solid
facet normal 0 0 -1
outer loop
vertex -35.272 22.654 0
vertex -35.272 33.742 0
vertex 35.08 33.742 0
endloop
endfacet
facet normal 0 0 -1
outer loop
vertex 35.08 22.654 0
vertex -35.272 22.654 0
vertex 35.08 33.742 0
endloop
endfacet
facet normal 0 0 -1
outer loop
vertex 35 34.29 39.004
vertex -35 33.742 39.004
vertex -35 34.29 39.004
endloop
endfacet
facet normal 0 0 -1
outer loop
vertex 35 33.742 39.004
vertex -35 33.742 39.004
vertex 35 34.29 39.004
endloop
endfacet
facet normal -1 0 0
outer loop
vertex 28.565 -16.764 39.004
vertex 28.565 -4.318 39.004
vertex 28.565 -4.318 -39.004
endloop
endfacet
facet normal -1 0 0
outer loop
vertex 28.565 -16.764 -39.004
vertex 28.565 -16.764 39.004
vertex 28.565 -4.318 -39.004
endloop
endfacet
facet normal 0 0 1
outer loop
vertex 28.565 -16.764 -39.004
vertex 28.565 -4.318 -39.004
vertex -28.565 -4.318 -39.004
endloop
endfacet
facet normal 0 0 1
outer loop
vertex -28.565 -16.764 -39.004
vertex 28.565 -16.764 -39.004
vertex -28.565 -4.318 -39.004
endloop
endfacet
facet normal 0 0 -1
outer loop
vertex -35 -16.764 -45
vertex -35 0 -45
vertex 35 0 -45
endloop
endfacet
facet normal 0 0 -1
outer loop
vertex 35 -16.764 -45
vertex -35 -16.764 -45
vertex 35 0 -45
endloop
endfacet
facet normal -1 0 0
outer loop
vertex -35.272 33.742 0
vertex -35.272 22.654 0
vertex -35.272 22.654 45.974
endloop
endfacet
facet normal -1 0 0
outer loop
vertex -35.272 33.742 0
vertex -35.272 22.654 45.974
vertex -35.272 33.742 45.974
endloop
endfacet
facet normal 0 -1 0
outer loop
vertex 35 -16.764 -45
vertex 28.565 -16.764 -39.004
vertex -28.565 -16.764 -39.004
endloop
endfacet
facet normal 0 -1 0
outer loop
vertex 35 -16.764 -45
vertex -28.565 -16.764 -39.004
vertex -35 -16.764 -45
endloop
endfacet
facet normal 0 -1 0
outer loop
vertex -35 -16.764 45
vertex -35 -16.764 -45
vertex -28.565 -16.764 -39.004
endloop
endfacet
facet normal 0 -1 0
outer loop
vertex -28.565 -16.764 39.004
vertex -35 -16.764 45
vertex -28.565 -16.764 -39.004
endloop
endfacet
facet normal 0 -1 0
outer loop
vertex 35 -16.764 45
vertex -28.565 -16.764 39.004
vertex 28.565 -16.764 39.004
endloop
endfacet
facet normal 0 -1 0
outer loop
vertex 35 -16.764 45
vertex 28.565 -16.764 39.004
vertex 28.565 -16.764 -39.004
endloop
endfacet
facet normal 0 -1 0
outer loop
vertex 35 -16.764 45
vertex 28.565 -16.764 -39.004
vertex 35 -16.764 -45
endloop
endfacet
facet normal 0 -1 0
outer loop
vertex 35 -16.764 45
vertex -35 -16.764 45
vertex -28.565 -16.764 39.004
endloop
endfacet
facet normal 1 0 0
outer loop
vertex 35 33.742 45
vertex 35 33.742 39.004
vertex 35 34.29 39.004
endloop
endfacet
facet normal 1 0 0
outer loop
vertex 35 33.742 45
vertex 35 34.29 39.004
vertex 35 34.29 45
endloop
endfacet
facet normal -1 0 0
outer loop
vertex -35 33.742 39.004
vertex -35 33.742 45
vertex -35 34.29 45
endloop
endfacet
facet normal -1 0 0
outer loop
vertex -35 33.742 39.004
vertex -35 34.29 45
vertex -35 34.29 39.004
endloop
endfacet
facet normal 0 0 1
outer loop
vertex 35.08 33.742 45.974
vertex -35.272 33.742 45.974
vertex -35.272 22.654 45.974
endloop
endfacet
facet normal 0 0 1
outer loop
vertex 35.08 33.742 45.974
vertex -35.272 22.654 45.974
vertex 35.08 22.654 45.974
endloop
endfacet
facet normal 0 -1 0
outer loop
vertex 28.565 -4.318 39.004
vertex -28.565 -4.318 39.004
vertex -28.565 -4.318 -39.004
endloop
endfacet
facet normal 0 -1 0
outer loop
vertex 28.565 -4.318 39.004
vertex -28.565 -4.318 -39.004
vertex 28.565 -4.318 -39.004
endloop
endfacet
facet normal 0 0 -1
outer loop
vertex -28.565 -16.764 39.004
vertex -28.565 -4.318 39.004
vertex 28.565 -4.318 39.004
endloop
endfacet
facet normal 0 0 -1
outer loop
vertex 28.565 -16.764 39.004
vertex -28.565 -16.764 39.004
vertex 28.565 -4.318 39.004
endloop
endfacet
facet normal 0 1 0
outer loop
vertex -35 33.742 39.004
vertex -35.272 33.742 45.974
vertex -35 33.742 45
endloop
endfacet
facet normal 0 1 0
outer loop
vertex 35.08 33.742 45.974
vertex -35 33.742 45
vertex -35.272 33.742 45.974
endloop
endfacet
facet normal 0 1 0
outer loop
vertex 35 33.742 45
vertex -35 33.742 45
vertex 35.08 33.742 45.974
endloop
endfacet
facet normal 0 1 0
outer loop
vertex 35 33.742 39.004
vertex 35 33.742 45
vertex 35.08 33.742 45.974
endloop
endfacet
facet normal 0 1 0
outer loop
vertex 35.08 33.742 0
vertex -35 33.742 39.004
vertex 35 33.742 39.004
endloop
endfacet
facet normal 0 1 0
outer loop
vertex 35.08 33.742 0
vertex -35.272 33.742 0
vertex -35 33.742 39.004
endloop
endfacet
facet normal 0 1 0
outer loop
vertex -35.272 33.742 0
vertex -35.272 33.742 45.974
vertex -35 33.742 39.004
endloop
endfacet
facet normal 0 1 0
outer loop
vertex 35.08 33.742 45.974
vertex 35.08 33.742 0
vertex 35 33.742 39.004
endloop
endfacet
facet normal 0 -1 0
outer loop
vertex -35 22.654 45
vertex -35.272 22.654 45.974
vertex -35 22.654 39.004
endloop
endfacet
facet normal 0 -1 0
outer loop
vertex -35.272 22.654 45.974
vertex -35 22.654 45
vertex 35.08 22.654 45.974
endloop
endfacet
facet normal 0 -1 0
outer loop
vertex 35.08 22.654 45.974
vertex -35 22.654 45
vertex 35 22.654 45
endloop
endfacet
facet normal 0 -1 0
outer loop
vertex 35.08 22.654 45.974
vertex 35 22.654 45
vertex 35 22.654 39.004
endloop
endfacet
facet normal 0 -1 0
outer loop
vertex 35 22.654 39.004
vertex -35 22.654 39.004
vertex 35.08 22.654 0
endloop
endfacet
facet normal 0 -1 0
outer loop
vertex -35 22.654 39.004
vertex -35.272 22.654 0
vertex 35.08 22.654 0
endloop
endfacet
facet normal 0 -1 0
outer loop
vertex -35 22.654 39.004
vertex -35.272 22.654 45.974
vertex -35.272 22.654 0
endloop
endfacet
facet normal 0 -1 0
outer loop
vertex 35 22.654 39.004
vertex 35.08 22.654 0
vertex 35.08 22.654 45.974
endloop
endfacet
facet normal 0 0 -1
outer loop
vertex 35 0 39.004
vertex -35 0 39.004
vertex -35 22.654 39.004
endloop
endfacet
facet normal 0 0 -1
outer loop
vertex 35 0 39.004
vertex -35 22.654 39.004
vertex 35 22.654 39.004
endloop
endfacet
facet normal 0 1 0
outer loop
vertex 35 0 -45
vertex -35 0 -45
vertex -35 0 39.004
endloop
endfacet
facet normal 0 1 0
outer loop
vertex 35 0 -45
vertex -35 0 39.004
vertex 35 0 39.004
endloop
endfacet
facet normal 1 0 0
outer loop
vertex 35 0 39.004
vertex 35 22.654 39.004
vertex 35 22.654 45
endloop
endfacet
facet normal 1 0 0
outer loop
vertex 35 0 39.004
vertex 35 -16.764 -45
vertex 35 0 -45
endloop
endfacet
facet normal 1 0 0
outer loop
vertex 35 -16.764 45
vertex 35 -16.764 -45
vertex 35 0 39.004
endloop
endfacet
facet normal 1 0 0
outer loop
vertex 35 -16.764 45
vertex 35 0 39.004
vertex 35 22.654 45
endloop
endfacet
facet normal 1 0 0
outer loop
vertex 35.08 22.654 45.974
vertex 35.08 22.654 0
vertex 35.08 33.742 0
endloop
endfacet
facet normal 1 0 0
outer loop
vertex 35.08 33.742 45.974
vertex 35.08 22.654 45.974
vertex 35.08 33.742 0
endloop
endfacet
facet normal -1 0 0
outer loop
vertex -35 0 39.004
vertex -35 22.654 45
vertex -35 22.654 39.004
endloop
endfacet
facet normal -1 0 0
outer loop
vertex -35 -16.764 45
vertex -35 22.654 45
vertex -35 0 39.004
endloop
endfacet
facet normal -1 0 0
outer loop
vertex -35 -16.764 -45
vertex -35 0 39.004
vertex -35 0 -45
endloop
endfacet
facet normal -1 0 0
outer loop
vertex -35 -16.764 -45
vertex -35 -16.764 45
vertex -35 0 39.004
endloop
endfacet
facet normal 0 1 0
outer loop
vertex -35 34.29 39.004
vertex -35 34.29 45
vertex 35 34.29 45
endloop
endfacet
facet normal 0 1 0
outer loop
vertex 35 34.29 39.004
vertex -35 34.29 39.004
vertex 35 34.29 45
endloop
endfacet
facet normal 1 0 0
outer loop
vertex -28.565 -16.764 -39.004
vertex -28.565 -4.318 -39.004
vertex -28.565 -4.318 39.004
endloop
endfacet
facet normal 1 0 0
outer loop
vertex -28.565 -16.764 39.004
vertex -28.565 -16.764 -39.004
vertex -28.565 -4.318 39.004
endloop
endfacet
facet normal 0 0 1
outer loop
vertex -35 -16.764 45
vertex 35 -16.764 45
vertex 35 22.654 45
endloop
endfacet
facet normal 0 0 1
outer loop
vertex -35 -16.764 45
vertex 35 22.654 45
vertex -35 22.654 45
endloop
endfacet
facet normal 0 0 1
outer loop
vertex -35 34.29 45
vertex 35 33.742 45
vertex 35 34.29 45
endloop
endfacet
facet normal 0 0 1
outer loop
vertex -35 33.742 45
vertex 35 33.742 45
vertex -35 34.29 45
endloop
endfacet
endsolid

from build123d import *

# Parameters (mm, degrees)
F1_DEPTH = 16.764
F2_W     = 70
F2_H     = 90
F3_DEPTH = 4.318
F4_DEPTH = 34.29
F5_W     = 70.352048
F5_H     = 11.088093
F6_DEPTH = 45.974


with BuildPart() as f1:
    # F0 (on Front) → F1 (new body)
    with BuildSketch(Plane.XZ):
        Polygon((35, 39.003629), (35, 45), (-35, 45), (-35, 39.003629), (-28.564712, 39.003629), (28.564712, 39.003629), align=None)
        Polygon((35, -45), (35, 39.003629), (28.564712, 39.003629), (28.564712, -39.003629), (-28.564712, -39.003629), (-28.564712, 39.003629), (-35, 39.003629), (-35, -45), align=None)
    extrude(amount=F1_DEPTH)

    # F2 (on Front) → F3 (join)
    with BuildSketch(Plane.XZ):
        Rectangle(F2_W, F2_H)
    extrude(amount=F3_DEPTH)

    # F0 (on Front) → F4 (join)
    with BuildSketch(Plane.XZ):
        Polygon((35, 39.003629), (35, 45), (-35, 45), (-35, 39.003629), (-28.564712, 39.003629), (28.564712, 39.003629), align=None)
    extrude(amount=-F4_DEPTH)

    # F5 (on Top) → F6 (join)
    with BuildSketch(Plane.XY):
        with Locations((-0.095587, 28.198169)):
            Rectangle(F5_W, F5_H)
    extrude(amount=F6_DEPTH)


solid = f1.part
